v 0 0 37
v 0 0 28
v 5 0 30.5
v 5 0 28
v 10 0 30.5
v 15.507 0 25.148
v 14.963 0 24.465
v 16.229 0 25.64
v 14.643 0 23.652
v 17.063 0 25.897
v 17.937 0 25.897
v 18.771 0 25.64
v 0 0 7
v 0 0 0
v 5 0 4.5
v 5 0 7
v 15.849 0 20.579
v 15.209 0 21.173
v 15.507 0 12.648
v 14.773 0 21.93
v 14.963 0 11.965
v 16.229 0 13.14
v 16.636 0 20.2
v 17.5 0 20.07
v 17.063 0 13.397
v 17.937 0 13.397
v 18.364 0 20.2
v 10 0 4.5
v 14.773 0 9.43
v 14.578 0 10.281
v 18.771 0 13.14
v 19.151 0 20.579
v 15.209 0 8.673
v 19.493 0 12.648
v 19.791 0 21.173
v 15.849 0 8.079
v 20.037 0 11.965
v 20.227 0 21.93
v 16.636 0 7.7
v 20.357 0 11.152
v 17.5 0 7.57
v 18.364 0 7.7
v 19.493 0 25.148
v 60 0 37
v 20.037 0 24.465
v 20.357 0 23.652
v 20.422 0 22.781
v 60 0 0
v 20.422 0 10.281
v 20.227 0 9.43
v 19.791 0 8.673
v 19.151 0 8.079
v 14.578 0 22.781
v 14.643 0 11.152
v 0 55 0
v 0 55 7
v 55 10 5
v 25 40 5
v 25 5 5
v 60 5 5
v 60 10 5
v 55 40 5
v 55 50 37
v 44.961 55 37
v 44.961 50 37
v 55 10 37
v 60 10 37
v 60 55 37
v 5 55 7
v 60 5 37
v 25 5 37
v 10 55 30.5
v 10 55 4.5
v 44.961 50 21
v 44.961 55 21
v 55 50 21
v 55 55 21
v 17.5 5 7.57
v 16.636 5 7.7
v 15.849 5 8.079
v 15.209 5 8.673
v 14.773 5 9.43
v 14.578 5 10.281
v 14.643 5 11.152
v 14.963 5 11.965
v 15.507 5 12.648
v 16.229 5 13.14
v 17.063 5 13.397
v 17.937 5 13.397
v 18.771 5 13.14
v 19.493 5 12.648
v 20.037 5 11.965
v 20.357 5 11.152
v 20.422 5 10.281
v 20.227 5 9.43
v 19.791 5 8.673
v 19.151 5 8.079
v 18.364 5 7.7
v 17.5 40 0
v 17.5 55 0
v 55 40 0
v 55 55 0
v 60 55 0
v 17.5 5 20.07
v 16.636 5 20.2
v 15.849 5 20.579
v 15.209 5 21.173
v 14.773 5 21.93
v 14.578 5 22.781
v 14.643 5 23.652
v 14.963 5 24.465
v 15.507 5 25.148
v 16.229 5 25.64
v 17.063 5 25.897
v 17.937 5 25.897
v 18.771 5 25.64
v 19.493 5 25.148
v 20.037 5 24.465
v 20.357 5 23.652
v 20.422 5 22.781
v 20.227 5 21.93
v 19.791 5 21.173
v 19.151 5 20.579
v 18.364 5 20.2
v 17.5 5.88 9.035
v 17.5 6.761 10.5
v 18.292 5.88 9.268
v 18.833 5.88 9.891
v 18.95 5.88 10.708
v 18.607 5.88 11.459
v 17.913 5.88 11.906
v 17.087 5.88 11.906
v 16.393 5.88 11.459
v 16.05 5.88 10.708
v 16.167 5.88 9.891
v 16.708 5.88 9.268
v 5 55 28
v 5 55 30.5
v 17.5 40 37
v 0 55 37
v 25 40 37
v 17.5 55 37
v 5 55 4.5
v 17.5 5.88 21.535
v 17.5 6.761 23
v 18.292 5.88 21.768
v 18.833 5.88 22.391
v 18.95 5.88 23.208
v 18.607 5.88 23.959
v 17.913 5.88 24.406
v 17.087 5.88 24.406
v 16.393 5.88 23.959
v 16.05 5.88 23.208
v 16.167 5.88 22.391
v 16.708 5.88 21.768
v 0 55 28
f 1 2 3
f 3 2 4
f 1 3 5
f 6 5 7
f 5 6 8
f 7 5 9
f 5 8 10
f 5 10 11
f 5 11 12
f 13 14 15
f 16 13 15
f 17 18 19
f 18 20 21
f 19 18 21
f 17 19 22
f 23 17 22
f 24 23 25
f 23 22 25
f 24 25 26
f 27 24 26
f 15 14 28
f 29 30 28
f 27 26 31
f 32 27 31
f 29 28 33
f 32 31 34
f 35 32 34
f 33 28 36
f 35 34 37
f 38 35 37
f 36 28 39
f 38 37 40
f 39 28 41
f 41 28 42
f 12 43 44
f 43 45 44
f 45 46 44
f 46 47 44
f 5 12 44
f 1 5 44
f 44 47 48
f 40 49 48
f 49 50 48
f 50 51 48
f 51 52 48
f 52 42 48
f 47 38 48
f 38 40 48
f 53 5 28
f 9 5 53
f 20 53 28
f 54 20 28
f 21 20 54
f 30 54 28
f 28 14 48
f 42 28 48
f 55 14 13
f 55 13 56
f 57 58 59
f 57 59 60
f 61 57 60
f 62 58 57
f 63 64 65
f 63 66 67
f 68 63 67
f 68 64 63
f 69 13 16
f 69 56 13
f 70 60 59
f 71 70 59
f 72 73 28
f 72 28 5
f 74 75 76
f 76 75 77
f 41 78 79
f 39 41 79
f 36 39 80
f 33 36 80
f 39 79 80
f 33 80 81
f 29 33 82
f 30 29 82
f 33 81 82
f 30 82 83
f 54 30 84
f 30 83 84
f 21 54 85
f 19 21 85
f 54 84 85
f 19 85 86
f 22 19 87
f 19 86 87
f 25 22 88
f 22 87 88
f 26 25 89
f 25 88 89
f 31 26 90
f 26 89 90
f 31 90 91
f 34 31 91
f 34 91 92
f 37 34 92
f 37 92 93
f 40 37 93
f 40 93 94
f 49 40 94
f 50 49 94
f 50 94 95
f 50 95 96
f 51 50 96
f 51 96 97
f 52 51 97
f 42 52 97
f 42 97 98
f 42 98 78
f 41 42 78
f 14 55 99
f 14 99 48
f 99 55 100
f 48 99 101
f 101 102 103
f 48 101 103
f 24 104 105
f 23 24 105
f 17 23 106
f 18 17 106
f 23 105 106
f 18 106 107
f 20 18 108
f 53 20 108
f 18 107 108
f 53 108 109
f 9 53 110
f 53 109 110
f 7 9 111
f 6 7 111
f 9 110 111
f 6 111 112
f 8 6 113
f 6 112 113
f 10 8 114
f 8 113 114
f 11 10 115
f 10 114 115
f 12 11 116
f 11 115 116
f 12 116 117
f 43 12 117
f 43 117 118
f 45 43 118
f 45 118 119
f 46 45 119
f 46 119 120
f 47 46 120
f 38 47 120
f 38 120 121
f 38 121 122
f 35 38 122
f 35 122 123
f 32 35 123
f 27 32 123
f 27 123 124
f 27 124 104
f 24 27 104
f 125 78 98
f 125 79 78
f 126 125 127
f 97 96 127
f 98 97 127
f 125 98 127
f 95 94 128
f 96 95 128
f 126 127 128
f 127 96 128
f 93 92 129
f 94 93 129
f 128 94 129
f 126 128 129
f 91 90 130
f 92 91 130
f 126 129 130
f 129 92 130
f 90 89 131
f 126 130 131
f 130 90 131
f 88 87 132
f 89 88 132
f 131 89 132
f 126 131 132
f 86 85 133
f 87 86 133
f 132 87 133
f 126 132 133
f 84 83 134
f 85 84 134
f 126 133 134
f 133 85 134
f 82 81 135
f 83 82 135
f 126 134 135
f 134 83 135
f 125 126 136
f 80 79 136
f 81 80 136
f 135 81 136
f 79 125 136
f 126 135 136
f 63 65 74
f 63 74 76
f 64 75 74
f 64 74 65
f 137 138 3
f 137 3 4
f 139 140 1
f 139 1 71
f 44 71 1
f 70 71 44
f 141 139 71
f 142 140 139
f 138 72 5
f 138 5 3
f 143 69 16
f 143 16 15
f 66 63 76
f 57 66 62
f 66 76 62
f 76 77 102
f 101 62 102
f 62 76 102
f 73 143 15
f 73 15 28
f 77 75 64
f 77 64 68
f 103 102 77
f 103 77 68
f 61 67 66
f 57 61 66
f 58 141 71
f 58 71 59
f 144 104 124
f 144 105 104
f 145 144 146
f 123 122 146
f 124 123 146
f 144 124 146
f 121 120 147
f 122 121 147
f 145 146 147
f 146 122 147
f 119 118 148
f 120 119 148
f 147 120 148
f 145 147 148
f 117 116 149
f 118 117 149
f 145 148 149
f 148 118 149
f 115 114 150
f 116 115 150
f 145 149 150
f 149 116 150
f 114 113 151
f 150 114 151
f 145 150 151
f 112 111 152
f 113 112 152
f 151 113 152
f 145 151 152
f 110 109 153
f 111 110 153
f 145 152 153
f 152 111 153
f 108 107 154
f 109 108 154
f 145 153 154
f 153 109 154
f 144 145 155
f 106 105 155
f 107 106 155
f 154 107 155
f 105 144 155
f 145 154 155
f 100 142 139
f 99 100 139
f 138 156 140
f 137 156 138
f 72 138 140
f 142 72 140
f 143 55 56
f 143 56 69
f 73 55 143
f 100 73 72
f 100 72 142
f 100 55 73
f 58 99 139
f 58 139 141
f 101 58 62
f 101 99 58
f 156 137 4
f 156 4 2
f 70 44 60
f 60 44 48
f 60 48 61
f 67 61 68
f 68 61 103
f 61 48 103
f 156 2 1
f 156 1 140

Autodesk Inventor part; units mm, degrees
ref_plane "YZ Plane" through (0, 0, 0) normal (1, 0, 0) x (0, 1, 0)
ref_plane "XZ Plane" through (0, 0, 0) normal (0, 1, 0) x (-1, 0, 0)
ref_plane "XY Plane" through (0, 0, 0) normal (0, 0, 1) x (1, 0, 0)
sketch "Sketch3" plane through (0, 0, 0) normal (0, 0, 1) x (1, 0, 0)
  line L0 (0, 0) -> (0, 55)
  line L1 (0, 55) -> (17.5, 55)
  line L2 (17.5, 55) -> (17.5, 40)
  line L3 (17.5, 40) -> (45, 40)
  line L4 (45, 40) -> (45, 55)
  line L5 (10.4377, 0) -> (0, 0)
  line L6 (45, 55) -> (60, 55)
  line L7 (60, 55) -> (60, 0)
  line L8 (60, 0) -> (0, 0)
  dimension "d7" = 55
  dimension "d8" = 17.5
  dimension "d12" = 15
  dimension "d13" = 27.5
  dimension "d14" = 15
  dimension "d15" = 55
  dimension "d16" = 60
extrude "Extrusion2" add sketch "Sketch3" along normal blind 5
sketch "Sketch4" plane through (0, 55, 0) normal (0, 1, 0) x (1, 0, 0)
  line L0 (17.5, -5) -> (0, -5) projected
  line L1 (0, -37) -> (17.5, -37)
  line L2 (17.5, -37) -> (17.5, -5)
  line L3 (17.5, -5) -> (0, -5)
  line L4 (0, -5) -> (0, -37)
  point P0 (0, 0)
  dimension "d20" = 32
  dimension "d21" = 17.5
extrude "Extrusion3" add sketch "Sketch4" against normal blind 55
sketch "Sketch5" plane through (45, 55, 0) normal (0, 1, 0) x (1, 0, 0)
  line L0 (15, 0) -> (15, -5) projected
  line L1 (-0.039, -37) -> (15, -37)
  line L2 (15, -37) -> (15, -5)
  line L3 (15, -5) -> (-0.039, -5)
  line L4 (-0.039, -5) -> (-0.039, -37)
  point P0 (-45, 0)
  dimension "d24" = 32
extrude "Extrusion4" add sketch "Sketch5" against normal blind 5
sketch "Sketch7" plane through (17.5, 40, 0) normal (0, 1, 0) x (1, 0, 0)
  line L0 (0, -5) -> (0, -37) projected
  line L1 (27.5, -5) -> (0, -5) projected
  line L2 (0, -37) -> (7.5, -37)
  line L3 (7.5, -37) -> (7.5, -5)
  line L4 (7.5, -5) -> (0, -5)
  line L5 (0, -5) -> (0, -37)
  point P0 (-17.5, 0)
  dimension "d27" = 7.5
extrude "Extrusion5" add sketch "Sketch7" against normal blind 40
sketch "Sketch8" plane through (0, 0, 5) normal (0, 0, 1) x (1, 0, 0)
  line L0 (25, 0) -> (60, 0) projected
  line L1 (60, 0) -> (60, 50) projected
  line L2 (25, 0) -> (60, 0)
  line L3 (60, 0) -> (60, 5)
  line L4 (60, 5) -> (25, 5)
  line L5 (25, 5) -> (25, 0)
  point P0 (0, 0)
  dimension "d30" = 5
extrude "Extrusion6" add sketch "Sketch8" along normal blind 32
sketch "Sketch9" plane through (0, 0, 5) normal (0, 0, 1) x (1, 0, 0)
  line L0 (60, 50) -> (45, 50) projected
  line L1 (60, 50) -> (55, 50)
  line L2 (55, 50) -> (55, 0)
  line L3 (55, 0) -> (60, 0)
  line L4 (60, 0) -> (60, 50)
  point P0 (0, 0)
  dimension "d31" = 32
  dimension "d33" = 50
  dimension "d34" = 5
extrude "Extrusion7" add sketch "Sketch9" along normal blind 32
sketch "Sketch10" plane through (0, 55, 0) normal (0, 1, 0) x (1, 0, 0)
  line L0 (10, -30.5) -> (5, -30.5)
  line L1 (5, -30.5) -> (5, -4.5)
  line L2 (5, -4.5) -> (10, -4.5)
  line L3 (10, -4.5) -> (10, -30.5)
  line L4 (17.5, 0) -> (17.5, -37) projected
  line L5 (0, 0) -> (17.5, 0) projected
  line L6 (0, 0) -> (0, -37) projected
  dimension "d45" = 5
  dimension "d46" = 26
  dimension "d47" = 7.5
  dimension "d48" = 4.5
extrude "Extrusion8" cut sketch "Sketch10" against normal blind 60
sketch "Sketch11" plane through (0, 55, 0) normal (0, 1, 0) x (1, 0, 0)
  line L0 (5, -4.5) -> (5, -30.5) projected
  line L1 (0, 0) -> (0, -37) projected
  line L2 (5, -28) -> (0, -28)
  line L3 (0, -28) -> (0, -7)
  line L4 (0, -7) -> (5, -7)
  line L5 (5, -7) -> (5, -28)
  line L6 (0, -37) -> (17.5, -37) projected
  point P0 (5, -35)
  dimension "d52" = 21
  dimension "d53" = 9
extrude "Extrusion9" cut sketch "Sketch11" against normal blind 60
sketch "Sketch12" plane through (0, 0, 0) normal (0, -1, 0) x (1, 0, 0)
  circle A0 centre (17.5, 10.5) radius 2.5
  circle A1 centre (17.5, 23) radius 2.5
  line L0 (10, 30.5) -> (10, 4.5) projected
  line L1 (0, 37) -> (60, 37) projected
  line L2 (60, 0) -> (0, 0) projected
  point P0 (10, 35)
  point P1 (25, 35)
  dimension "d56" = 5
  dimension "d57" = 5
  dimension "d58" = 7.5
  dimension "d59" = 7.5
  dimension "d78" = 14
  dimension "d79" = 12.5
hole "Hole1" at (17.5, 0, 10.5) at (17.5, 0, 23) direction (0, 1, 0) diameter 5.86 depth 5 tip angle 118
sketch "Sketch14" plane through (0, 55, 37) normal (0, 0, 1) x (1, 0, 0)
  line L0 (55, -5) -> (55, -50) projected
  line L1 (60, 0) -> (60, -55) projected
  line L2 (55, -50) -> (60, -50)
  line L3 (60, -50) -> (60, -45)
  line L4 (60, -45) -> (55, -45)
  line L5 (55, -45) -> (55, -50)
  point P0 (0, -55)
  dimension "d69" = 5
extrude "Extrusion10" cut sketch "Sketch14" along normal mid plane 64
sketch "Sketch20" plane through (45, 55, 0) normal (0, 1, 0) x (1, 0, 0)
  line L0 (-0.039, -37) -> (-0.039, -5) projected
  line L1 (0, 0) -> (15, 0) projected
  line L2 (-0.039, -21) -> (10, -21)
  line L3 (10, -21) -> (10, 0)
  line L4 (10, 0) -> (-0.039, 0)
  line L5 (-0.039, 0) -> (-0.039, -21)
  line L6 (15, 0) -> (15, -37) projected
  point P0 (-45, 0)
  dimension "d77" = 5
extrude "Extrusion12" cut sketch "Sketch20" against normal blind 15
properties part number "Holder" material "Iron, Cast"
